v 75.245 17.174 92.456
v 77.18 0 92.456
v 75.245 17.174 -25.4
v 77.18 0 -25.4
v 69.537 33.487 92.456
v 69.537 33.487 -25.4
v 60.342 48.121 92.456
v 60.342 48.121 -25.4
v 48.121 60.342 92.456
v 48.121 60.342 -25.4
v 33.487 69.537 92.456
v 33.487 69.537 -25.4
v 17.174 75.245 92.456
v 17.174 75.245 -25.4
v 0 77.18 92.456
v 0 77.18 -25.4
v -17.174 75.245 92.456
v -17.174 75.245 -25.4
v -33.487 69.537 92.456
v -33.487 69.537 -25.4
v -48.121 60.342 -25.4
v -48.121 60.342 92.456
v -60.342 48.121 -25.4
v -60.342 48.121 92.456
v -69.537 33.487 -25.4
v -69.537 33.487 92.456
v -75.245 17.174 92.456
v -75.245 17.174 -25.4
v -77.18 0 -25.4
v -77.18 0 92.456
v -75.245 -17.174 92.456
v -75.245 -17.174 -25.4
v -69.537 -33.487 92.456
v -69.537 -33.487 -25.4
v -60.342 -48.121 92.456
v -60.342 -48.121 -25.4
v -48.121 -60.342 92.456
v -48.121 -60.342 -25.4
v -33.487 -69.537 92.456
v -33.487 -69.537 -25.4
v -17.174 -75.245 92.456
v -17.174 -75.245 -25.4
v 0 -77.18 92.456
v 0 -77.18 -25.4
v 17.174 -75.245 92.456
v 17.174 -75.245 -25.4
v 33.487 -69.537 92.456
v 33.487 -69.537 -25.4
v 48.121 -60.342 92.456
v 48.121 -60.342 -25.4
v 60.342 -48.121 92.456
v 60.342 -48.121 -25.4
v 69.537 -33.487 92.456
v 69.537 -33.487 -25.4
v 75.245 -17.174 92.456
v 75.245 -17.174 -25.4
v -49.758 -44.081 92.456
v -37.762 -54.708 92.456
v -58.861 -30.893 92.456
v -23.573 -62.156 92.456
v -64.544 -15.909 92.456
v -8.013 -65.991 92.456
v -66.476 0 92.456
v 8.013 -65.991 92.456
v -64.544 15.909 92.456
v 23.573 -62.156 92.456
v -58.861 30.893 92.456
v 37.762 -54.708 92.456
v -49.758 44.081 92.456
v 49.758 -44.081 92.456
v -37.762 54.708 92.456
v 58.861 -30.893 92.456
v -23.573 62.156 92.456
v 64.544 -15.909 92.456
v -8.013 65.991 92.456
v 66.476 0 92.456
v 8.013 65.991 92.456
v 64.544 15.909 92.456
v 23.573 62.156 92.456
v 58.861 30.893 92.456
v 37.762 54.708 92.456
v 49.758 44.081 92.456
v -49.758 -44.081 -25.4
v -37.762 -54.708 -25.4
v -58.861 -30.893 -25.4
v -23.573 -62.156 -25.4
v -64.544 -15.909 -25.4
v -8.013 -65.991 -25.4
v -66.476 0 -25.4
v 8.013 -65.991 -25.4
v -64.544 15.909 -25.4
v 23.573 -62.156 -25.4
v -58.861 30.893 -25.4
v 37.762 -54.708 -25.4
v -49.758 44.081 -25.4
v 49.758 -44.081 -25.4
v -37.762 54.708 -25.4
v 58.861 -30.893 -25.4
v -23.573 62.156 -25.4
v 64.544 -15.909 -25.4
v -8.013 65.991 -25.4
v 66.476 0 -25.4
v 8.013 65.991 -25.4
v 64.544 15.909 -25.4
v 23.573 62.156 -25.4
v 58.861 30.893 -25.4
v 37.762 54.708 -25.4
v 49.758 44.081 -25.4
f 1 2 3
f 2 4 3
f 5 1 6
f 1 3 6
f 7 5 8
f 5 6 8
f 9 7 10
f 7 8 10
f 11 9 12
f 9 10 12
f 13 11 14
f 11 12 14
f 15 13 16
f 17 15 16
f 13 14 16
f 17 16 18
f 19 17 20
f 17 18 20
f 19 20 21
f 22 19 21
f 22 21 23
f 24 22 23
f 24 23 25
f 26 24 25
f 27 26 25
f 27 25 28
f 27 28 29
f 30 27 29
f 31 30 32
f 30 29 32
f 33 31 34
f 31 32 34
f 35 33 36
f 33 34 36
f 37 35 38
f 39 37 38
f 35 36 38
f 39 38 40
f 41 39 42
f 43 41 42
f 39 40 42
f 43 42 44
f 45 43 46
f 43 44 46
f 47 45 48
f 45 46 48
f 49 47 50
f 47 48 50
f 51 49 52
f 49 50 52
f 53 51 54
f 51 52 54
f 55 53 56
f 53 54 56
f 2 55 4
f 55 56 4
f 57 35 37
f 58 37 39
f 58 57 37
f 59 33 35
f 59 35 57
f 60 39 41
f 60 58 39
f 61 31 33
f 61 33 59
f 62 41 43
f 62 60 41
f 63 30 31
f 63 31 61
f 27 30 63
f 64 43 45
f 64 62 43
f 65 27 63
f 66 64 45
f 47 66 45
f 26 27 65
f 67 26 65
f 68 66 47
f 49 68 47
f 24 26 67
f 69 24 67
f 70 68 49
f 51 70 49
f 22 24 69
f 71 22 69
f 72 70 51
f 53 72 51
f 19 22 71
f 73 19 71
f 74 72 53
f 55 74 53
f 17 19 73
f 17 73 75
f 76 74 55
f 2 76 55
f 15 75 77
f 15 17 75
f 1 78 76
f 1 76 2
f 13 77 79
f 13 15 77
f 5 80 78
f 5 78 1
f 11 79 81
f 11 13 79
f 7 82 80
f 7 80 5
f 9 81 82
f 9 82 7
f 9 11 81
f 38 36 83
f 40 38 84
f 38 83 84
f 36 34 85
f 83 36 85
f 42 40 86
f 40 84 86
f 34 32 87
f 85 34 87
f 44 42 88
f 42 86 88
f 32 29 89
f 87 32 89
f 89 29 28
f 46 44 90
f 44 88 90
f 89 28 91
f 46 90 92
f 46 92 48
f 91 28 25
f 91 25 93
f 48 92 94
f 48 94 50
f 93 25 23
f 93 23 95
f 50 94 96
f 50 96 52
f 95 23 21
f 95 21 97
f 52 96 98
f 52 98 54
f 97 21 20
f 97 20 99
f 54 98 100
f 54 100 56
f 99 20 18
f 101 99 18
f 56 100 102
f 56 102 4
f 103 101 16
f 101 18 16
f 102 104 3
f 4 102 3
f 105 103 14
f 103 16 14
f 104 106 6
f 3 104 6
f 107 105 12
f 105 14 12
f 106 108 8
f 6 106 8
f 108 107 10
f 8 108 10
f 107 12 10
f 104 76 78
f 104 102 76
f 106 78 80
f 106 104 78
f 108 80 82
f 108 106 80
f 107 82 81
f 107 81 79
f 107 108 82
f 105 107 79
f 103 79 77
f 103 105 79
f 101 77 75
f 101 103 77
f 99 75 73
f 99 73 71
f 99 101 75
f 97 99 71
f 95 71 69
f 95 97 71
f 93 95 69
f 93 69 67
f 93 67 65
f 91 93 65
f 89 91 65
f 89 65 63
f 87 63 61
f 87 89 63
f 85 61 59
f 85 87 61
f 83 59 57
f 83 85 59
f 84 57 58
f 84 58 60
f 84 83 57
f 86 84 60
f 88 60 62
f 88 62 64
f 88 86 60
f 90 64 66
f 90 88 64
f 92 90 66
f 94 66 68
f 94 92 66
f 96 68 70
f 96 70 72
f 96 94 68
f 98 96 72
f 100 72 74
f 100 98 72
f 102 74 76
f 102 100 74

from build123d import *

# Parameters (mm, degrees)
F0_R     = 77.1800342887
F0_R_2   = 66.4755295027
F1_DEPTH = 25.4
F2_DEPTH = 25.4
F3_DEPTH = 67.056


with BuildPart() as f1:
    # F0 (on Top) → F1 (new body)
    with BuildSketch(Plane.XY):
        Circle(F0_R)
        Circle(F0_R_2, mode=Mode.SUBTRACT)
    extrude(amount=F1_DEPTH)

    # F2 (add): faces of the model
    f2_faces = [f1.faces().sort_by_distance(p)[0] for p in [
        (-74.997053264, 0, 0),
        (-74.997053264, 0, 25.4),
    ]]
    extrude(f2_faces, amount=F2_DEPTH, dir=(0, 0, -1))

    # F3 (add): a face of the model
    f3_faces = [f1.faces().sort_by_distance(p)[0] for p in [
        (-74.997053264, 0, 25.4),
    ]]
    extrude(f3_faces, amount=F3_DEPTH)


solid = f1.part
